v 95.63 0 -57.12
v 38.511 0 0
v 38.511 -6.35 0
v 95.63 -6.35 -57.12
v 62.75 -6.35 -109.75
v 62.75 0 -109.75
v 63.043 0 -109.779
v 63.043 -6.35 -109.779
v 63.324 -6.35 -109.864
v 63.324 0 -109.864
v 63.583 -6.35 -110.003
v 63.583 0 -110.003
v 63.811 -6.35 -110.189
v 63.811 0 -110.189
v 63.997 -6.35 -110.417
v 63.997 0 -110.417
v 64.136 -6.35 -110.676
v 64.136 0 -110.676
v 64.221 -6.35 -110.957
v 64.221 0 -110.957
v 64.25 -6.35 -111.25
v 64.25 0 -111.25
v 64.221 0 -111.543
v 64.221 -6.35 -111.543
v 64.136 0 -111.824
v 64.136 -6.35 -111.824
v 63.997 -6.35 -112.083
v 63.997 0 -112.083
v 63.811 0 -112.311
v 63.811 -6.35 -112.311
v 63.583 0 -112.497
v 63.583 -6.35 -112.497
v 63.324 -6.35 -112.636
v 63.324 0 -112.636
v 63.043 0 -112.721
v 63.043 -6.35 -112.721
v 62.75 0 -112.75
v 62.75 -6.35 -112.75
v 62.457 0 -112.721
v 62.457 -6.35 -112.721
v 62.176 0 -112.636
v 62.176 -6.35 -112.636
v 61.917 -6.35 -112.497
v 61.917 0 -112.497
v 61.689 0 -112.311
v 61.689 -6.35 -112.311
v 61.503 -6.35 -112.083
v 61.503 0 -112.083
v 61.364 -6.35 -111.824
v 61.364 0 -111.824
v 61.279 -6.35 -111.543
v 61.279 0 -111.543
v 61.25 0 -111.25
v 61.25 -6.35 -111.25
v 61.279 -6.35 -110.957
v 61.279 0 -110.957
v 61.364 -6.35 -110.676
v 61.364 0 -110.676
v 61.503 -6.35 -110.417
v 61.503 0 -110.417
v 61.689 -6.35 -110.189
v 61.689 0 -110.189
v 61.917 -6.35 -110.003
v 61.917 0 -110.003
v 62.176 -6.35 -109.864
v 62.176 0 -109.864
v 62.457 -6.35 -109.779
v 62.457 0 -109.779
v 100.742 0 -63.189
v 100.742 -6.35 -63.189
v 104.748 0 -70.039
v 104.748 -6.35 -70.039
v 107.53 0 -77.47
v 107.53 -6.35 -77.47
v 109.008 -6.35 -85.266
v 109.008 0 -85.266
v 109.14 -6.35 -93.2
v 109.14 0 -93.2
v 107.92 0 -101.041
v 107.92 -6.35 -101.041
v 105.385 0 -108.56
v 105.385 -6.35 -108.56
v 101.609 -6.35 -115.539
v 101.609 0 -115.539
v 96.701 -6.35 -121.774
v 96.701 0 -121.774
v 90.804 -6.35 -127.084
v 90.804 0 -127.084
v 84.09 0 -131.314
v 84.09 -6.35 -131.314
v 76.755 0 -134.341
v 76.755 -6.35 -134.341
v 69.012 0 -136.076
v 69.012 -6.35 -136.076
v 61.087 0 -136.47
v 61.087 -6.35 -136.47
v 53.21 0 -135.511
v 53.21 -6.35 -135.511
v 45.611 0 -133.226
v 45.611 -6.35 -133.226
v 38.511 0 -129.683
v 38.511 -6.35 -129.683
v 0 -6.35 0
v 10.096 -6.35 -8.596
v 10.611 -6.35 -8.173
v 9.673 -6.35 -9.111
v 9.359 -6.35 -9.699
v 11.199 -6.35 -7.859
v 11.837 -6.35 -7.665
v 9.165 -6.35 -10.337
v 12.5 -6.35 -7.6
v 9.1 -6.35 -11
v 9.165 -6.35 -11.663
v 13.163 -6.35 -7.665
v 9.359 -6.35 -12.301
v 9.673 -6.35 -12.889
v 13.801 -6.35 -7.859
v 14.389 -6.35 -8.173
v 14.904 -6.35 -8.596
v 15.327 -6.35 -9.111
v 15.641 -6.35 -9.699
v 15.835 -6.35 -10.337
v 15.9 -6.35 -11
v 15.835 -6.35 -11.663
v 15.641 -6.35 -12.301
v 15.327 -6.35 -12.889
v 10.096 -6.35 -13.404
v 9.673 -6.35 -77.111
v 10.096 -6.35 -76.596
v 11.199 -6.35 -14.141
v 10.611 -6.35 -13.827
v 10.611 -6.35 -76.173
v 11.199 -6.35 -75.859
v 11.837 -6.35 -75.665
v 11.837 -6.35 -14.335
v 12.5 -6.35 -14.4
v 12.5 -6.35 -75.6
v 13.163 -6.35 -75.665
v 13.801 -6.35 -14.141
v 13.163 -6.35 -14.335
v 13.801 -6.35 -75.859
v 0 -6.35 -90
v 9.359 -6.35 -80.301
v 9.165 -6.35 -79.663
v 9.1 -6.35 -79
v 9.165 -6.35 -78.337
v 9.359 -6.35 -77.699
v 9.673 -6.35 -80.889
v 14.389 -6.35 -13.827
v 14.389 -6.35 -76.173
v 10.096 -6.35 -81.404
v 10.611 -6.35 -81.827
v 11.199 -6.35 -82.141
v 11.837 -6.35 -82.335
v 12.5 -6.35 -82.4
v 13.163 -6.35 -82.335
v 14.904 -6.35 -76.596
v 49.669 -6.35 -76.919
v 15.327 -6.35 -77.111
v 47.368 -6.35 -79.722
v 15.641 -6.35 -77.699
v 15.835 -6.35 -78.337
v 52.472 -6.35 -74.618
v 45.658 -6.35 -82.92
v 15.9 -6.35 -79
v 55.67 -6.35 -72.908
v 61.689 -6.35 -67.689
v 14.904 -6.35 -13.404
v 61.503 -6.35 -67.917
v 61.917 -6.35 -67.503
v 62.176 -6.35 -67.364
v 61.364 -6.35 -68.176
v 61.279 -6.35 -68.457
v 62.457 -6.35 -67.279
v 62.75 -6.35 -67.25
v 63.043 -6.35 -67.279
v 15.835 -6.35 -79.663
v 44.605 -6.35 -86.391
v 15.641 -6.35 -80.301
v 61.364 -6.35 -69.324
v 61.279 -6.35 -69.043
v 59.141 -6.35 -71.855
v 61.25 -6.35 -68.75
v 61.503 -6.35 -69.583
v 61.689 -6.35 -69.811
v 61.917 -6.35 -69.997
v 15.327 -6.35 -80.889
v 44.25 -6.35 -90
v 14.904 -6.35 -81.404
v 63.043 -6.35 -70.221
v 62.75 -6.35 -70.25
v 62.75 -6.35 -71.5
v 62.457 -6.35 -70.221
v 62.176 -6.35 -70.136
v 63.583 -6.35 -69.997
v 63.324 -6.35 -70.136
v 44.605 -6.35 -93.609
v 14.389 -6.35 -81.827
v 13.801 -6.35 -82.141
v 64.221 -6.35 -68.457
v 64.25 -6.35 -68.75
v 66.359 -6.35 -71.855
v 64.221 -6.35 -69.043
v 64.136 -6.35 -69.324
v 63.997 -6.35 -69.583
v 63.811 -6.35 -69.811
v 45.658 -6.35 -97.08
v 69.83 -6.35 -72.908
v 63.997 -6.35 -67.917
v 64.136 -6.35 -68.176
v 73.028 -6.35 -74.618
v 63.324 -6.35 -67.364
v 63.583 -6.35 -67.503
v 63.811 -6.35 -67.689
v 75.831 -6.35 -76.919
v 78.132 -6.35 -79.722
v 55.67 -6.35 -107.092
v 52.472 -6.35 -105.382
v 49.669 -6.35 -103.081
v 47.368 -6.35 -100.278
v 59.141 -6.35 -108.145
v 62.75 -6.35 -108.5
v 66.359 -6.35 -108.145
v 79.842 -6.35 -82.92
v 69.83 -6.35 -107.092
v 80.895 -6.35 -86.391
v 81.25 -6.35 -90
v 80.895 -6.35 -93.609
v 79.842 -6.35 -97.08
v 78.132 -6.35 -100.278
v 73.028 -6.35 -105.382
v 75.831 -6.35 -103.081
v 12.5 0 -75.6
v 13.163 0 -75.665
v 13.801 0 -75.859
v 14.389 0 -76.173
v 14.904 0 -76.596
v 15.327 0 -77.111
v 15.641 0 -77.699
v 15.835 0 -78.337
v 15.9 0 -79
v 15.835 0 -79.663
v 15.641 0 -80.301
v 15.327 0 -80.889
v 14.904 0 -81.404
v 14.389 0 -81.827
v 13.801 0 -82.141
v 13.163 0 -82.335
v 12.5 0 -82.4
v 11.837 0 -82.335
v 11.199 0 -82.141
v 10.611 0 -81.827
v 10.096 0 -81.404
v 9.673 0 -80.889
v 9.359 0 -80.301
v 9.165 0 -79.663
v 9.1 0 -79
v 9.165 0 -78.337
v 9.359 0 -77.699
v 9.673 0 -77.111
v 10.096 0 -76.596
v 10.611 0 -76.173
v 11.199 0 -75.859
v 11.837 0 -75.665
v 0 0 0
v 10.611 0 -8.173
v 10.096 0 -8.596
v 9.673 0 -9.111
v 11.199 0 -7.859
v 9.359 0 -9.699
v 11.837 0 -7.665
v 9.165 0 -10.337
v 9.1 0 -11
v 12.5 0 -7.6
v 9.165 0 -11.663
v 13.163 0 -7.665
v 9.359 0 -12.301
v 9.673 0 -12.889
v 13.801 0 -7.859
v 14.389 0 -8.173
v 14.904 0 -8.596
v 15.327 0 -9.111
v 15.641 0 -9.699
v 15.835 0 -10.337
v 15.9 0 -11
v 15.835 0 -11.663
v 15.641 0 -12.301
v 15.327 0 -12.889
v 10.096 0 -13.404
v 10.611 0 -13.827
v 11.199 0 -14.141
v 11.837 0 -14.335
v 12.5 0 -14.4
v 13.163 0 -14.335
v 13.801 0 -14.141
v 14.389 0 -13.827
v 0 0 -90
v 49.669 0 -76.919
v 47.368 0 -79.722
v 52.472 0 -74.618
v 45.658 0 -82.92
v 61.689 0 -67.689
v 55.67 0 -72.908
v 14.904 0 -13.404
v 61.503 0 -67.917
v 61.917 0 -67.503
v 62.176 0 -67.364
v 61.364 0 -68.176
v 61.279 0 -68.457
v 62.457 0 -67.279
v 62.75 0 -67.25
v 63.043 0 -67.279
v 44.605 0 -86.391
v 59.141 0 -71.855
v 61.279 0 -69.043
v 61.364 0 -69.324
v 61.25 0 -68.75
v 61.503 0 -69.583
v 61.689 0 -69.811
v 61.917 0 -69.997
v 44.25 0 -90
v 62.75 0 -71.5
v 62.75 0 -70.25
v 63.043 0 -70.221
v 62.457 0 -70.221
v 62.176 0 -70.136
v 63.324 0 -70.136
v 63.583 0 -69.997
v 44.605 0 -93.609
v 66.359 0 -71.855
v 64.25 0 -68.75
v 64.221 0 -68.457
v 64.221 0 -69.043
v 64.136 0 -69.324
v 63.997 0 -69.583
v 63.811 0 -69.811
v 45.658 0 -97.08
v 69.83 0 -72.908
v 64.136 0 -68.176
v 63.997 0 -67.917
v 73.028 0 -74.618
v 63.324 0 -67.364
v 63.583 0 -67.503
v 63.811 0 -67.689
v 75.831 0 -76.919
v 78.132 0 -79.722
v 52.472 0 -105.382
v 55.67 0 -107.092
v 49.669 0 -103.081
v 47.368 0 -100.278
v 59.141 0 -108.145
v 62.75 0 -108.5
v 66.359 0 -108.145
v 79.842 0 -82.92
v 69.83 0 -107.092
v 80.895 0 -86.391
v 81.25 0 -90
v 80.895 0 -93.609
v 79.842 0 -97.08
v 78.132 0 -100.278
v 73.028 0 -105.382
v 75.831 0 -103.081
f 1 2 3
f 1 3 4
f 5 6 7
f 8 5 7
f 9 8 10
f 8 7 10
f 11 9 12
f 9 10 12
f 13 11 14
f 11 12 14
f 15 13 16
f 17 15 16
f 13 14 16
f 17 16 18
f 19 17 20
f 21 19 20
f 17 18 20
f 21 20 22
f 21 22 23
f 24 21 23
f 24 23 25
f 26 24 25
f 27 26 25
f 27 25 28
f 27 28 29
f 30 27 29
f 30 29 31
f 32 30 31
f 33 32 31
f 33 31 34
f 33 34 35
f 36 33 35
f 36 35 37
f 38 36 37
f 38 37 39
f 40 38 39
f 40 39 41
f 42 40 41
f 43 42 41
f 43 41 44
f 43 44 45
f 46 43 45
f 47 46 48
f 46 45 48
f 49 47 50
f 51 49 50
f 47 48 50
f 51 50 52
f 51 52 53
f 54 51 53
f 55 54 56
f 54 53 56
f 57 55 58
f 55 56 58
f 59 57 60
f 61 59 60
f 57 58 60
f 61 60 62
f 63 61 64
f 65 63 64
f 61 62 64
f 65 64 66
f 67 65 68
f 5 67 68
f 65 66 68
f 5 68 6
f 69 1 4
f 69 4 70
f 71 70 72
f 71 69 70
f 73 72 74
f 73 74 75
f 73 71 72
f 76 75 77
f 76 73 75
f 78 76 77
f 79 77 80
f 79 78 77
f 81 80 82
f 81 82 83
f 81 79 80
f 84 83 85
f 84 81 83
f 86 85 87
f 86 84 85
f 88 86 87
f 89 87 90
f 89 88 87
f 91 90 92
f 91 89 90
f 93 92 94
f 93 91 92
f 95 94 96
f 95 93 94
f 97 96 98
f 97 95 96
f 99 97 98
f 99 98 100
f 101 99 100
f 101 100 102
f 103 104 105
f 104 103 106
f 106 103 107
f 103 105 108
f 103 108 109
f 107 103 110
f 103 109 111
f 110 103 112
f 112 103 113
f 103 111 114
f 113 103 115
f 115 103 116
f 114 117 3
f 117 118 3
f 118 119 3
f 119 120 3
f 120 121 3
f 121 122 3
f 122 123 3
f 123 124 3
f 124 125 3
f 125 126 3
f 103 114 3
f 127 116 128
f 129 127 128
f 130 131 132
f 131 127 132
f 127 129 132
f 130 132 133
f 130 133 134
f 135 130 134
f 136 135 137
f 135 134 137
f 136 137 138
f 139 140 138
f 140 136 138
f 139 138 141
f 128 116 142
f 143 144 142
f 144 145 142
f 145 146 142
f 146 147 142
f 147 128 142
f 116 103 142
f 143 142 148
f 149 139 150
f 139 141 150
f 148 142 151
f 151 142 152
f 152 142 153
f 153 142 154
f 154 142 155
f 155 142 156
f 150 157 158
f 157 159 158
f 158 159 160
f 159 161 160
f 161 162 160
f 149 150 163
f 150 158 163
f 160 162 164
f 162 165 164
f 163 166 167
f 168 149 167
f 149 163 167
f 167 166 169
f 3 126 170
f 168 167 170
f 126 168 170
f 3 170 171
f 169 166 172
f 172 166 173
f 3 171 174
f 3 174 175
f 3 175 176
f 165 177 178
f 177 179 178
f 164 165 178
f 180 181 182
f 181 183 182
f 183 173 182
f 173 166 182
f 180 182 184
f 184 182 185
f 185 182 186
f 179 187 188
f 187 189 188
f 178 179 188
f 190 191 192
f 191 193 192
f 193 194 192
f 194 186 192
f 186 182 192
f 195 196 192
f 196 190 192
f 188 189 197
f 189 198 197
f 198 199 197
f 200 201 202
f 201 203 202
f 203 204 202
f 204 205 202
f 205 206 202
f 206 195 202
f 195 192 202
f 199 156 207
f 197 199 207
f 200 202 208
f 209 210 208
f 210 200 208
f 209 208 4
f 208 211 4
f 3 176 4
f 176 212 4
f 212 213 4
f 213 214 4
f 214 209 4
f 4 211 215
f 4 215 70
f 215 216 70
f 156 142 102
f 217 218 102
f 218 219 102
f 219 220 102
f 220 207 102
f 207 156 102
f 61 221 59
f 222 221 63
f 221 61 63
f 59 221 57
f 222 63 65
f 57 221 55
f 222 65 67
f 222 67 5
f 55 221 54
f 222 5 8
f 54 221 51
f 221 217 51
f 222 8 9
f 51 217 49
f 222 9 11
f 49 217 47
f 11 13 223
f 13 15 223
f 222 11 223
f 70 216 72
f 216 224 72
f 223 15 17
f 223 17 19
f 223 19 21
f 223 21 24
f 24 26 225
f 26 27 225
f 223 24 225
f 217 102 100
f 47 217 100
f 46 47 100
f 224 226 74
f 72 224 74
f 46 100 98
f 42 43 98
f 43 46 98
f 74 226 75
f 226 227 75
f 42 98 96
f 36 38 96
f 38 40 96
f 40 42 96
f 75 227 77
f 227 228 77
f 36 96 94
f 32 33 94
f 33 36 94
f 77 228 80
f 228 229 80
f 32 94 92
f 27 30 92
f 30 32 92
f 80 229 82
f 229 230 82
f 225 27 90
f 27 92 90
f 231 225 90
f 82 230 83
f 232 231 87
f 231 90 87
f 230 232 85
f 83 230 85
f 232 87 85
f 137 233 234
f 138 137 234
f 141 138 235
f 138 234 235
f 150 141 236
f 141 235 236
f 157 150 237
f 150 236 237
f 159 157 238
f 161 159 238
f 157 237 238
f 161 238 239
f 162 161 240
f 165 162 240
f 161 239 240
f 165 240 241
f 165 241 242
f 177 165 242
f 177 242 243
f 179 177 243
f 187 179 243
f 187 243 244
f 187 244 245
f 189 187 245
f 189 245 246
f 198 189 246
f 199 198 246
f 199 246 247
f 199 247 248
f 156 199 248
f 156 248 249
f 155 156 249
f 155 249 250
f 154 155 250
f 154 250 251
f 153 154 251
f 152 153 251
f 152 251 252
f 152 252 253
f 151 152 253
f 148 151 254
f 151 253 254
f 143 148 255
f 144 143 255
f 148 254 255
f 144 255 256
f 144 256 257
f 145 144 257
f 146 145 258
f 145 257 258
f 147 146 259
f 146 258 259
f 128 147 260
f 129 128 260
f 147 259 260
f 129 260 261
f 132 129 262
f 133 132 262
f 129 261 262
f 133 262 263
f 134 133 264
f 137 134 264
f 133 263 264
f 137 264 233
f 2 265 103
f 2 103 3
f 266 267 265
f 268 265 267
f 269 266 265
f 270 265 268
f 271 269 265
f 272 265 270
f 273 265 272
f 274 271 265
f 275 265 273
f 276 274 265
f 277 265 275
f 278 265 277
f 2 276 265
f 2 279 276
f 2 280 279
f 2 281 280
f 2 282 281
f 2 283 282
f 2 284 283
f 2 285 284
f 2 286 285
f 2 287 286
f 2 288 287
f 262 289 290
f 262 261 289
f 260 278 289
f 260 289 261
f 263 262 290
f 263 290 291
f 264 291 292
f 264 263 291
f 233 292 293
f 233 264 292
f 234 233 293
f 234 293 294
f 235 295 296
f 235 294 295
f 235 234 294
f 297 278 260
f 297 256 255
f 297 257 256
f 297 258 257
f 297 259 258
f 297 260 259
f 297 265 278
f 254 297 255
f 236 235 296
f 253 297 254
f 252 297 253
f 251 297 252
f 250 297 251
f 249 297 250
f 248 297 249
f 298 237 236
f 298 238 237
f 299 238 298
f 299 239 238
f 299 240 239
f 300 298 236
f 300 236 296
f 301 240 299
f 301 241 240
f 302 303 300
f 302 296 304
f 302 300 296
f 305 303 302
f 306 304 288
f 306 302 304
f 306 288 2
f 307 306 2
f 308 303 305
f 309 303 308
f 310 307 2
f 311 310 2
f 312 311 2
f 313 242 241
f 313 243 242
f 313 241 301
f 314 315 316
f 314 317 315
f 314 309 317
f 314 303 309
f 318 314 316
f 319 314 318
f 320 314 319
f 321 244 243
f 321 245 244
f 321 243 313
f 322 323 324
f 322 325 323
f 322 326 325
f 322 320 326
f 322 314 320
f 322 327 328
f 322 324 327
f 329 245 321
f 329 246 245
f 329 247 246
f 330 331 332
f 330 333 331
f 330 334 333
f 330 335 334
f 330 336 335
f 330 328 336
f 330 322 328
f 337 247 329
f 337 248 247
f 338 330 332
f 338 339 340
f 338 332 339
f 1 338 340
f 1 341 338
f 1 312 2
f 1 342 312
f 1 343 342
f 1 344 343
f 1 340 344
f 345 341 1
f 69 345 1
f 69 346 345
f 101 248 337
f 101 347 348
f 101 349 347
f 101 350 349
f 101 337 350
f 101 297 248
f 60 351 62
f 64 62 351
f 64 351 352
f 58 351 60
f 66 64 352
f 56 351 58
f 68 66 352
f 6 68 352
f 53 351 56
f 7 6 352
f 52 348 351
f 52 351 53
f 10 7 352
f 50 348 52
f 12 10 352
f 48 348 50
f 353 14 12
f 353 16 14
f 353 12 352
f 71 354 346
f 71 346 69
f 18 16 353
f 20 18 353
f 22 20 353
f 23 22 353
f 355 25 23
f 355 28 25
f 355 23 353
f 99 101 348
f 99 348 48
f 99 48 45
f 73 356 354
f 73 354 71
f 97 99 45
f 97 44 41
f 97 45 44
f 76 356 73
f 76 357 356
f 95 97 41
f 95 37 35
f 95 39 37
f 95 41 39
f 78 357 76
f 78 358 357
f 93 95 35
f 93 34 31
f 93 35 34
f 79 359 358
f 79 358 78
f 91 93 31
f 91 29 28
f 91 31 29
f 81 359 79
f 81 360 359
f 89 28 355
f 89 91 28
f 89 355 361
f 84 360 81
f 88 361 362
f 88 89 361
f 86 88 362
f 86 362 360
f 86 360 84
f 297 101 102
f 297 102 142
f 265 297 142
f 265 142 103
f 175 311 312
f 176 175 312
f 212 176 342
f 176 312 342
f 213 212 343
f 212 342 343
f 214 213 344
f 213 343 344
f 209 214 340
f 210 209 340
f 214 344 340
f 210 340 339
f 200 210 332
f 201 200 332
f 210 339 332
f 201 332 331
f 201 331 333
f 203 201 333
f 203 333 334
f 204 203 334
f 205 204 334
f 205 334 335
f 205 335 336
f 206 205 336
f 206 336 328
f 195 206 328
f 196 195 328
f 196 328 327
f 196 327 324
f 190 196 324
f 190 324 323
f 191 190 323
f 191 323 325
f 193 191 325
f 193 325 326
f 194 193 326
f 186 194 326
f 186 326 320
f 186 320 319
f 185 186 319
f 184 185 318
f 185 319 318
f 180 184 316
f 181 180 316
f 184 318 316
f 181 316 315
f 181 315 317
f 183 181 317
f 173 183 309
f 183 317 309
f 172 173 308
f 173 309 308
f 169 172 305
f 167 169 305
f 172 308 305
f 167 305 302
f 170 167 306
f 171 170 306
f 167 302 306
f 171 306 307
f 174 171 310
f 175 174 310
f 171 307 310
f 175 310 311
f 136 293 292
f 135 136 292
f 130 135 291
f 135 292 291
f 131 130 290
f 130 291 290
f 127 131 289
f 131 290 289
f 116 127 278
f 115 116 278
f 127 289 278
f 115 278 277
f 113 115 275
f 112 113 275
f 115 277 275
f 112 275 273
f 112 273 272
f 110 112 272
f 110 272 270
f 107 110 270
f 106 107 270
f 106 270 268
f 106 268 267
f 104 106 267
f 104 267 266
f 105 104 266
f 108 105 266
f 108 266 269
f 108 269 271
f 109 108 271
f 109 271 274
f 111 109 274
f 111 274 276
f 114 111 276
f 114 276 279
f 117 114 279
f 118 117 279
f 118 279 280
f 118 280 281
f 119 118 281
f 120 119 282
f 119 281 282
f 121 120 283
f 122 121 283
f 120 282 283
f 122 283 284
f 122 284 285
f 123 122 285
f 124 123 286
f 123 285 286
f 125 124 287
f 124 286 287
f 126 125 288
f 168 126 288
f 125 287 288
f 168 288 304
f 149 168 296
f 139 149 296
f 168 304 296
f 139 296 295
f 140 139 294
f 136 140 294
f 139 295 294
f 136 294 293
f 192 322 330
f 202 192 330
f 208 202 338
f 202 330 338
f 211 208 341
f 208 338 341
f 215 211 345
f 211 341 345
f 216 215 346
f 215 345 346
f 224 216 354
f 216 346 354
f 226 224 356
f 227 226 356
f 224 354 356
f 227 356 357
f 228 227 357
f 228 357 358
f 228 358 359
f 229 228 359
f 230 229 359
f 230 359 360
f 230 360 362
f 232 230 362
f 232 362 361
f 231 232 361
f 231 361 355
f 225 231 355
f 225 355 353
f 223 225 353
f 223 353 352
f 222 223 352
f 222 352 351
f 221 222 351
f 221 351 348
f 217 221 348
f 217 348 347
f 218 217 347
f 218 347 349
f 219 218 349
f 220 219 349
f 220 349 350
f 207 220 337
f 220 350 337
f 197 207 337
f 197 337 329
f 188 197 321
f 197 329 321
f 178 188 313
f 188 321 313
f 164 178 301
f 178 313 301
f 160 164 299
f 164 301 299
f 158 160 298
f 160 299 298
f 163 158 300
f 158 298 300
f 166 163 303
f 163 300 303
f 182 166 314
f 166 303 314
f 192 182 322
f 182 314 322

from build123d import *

# Parameters (mm, degrees)
BASE_FLANGE1_DEPTH = 6.35
SKETCH8_R          = 3.4
CUT_EXTRUDE1_DEPTH = 175.95180765
SKETCH9_R          = 18.5
CUT_EXTRUDE2_DEPTH = 175.95180765
SKETCH10_R         = 1.5
CUT_EXTRUDE3_DEPTH = 175.95180765


# Sheet-metal steps are written as plain solids
with BuildPart() as part:
    # Sketch2 → Base-Flange1 (new body)
    with BuildSketch(Plane(origin=(0, 0, 0), x_dir=(1, 0, 0), z_dir=(0, 1, 0))):
        with BuildLine():
            Line((0, 0), (38.51093065, 0))
            Line((38.51093065, 0), (95.630465325, 57.119534675))
            ThreePointArc((95.630465325, 57.119534675), (99.287953618, 118.761570635), (38.51093065, 129.682710556))
            Line((38.51093065, 129.682710556), (0, 90))
            Line((0, 90), (0, 0))
        make_face()
    extrude(amount=-BASE_FLANGE1_DEPTH)

    # Sketch8 → Cut-Extrude1 (cut, through all)
    with BuildSketch(Plane(origin=(0, 0, 0), x_dir=(1, 0, 0), z_dir=(0, 1, 0))):
        with Locations(Location((12.5, 79, 0), (0, 0, 270))):
            Circle(SKETCH8_R)
        with Locations(Location((12.5, 11, 0), (0, 0, 90))):
            Circle(SKETCH8_R)
    extrude(amount=-CUT_EXTRUDE1_DEPTH, mode=Mode.SUBTRACT)

    # Sketch9 → Cut-Extrude2 (cut, through all)
    with BuildSketch(Plane(origin=(0, 0, 0), x_dir=(1, 0, 0), z_dir=(0, 1, 0))):
        with Locations(Location((62.75, 90, 0), (0, 0, 270))):
            Circle(SKETCH9_R)
    extrude(amount=-CUT_EXTRUDE2_DEPTH, mode=Mode.SUBTRACT)

    # Sketch10 → Cut-Extrude3 (cut, through all)
    with BuildSketch(Plane(origin=(0, 0, 0), x_dir=(1, 0, 0), z_dir=(0, 1, 0))):
        with Locations(Location((62.75, 111.25, 0), (0, 0, 270))):
            Circle(SKETCH10_R)
        with Locations(Location((62.75, 68.75, 0), (0, 0, 270))):
            Circle(SKETCH10_R)
    extrude(amount=-CUT_EXTRUDE3_DEPTH, mode=Mode.SUBTRACT)


solid = part.part
